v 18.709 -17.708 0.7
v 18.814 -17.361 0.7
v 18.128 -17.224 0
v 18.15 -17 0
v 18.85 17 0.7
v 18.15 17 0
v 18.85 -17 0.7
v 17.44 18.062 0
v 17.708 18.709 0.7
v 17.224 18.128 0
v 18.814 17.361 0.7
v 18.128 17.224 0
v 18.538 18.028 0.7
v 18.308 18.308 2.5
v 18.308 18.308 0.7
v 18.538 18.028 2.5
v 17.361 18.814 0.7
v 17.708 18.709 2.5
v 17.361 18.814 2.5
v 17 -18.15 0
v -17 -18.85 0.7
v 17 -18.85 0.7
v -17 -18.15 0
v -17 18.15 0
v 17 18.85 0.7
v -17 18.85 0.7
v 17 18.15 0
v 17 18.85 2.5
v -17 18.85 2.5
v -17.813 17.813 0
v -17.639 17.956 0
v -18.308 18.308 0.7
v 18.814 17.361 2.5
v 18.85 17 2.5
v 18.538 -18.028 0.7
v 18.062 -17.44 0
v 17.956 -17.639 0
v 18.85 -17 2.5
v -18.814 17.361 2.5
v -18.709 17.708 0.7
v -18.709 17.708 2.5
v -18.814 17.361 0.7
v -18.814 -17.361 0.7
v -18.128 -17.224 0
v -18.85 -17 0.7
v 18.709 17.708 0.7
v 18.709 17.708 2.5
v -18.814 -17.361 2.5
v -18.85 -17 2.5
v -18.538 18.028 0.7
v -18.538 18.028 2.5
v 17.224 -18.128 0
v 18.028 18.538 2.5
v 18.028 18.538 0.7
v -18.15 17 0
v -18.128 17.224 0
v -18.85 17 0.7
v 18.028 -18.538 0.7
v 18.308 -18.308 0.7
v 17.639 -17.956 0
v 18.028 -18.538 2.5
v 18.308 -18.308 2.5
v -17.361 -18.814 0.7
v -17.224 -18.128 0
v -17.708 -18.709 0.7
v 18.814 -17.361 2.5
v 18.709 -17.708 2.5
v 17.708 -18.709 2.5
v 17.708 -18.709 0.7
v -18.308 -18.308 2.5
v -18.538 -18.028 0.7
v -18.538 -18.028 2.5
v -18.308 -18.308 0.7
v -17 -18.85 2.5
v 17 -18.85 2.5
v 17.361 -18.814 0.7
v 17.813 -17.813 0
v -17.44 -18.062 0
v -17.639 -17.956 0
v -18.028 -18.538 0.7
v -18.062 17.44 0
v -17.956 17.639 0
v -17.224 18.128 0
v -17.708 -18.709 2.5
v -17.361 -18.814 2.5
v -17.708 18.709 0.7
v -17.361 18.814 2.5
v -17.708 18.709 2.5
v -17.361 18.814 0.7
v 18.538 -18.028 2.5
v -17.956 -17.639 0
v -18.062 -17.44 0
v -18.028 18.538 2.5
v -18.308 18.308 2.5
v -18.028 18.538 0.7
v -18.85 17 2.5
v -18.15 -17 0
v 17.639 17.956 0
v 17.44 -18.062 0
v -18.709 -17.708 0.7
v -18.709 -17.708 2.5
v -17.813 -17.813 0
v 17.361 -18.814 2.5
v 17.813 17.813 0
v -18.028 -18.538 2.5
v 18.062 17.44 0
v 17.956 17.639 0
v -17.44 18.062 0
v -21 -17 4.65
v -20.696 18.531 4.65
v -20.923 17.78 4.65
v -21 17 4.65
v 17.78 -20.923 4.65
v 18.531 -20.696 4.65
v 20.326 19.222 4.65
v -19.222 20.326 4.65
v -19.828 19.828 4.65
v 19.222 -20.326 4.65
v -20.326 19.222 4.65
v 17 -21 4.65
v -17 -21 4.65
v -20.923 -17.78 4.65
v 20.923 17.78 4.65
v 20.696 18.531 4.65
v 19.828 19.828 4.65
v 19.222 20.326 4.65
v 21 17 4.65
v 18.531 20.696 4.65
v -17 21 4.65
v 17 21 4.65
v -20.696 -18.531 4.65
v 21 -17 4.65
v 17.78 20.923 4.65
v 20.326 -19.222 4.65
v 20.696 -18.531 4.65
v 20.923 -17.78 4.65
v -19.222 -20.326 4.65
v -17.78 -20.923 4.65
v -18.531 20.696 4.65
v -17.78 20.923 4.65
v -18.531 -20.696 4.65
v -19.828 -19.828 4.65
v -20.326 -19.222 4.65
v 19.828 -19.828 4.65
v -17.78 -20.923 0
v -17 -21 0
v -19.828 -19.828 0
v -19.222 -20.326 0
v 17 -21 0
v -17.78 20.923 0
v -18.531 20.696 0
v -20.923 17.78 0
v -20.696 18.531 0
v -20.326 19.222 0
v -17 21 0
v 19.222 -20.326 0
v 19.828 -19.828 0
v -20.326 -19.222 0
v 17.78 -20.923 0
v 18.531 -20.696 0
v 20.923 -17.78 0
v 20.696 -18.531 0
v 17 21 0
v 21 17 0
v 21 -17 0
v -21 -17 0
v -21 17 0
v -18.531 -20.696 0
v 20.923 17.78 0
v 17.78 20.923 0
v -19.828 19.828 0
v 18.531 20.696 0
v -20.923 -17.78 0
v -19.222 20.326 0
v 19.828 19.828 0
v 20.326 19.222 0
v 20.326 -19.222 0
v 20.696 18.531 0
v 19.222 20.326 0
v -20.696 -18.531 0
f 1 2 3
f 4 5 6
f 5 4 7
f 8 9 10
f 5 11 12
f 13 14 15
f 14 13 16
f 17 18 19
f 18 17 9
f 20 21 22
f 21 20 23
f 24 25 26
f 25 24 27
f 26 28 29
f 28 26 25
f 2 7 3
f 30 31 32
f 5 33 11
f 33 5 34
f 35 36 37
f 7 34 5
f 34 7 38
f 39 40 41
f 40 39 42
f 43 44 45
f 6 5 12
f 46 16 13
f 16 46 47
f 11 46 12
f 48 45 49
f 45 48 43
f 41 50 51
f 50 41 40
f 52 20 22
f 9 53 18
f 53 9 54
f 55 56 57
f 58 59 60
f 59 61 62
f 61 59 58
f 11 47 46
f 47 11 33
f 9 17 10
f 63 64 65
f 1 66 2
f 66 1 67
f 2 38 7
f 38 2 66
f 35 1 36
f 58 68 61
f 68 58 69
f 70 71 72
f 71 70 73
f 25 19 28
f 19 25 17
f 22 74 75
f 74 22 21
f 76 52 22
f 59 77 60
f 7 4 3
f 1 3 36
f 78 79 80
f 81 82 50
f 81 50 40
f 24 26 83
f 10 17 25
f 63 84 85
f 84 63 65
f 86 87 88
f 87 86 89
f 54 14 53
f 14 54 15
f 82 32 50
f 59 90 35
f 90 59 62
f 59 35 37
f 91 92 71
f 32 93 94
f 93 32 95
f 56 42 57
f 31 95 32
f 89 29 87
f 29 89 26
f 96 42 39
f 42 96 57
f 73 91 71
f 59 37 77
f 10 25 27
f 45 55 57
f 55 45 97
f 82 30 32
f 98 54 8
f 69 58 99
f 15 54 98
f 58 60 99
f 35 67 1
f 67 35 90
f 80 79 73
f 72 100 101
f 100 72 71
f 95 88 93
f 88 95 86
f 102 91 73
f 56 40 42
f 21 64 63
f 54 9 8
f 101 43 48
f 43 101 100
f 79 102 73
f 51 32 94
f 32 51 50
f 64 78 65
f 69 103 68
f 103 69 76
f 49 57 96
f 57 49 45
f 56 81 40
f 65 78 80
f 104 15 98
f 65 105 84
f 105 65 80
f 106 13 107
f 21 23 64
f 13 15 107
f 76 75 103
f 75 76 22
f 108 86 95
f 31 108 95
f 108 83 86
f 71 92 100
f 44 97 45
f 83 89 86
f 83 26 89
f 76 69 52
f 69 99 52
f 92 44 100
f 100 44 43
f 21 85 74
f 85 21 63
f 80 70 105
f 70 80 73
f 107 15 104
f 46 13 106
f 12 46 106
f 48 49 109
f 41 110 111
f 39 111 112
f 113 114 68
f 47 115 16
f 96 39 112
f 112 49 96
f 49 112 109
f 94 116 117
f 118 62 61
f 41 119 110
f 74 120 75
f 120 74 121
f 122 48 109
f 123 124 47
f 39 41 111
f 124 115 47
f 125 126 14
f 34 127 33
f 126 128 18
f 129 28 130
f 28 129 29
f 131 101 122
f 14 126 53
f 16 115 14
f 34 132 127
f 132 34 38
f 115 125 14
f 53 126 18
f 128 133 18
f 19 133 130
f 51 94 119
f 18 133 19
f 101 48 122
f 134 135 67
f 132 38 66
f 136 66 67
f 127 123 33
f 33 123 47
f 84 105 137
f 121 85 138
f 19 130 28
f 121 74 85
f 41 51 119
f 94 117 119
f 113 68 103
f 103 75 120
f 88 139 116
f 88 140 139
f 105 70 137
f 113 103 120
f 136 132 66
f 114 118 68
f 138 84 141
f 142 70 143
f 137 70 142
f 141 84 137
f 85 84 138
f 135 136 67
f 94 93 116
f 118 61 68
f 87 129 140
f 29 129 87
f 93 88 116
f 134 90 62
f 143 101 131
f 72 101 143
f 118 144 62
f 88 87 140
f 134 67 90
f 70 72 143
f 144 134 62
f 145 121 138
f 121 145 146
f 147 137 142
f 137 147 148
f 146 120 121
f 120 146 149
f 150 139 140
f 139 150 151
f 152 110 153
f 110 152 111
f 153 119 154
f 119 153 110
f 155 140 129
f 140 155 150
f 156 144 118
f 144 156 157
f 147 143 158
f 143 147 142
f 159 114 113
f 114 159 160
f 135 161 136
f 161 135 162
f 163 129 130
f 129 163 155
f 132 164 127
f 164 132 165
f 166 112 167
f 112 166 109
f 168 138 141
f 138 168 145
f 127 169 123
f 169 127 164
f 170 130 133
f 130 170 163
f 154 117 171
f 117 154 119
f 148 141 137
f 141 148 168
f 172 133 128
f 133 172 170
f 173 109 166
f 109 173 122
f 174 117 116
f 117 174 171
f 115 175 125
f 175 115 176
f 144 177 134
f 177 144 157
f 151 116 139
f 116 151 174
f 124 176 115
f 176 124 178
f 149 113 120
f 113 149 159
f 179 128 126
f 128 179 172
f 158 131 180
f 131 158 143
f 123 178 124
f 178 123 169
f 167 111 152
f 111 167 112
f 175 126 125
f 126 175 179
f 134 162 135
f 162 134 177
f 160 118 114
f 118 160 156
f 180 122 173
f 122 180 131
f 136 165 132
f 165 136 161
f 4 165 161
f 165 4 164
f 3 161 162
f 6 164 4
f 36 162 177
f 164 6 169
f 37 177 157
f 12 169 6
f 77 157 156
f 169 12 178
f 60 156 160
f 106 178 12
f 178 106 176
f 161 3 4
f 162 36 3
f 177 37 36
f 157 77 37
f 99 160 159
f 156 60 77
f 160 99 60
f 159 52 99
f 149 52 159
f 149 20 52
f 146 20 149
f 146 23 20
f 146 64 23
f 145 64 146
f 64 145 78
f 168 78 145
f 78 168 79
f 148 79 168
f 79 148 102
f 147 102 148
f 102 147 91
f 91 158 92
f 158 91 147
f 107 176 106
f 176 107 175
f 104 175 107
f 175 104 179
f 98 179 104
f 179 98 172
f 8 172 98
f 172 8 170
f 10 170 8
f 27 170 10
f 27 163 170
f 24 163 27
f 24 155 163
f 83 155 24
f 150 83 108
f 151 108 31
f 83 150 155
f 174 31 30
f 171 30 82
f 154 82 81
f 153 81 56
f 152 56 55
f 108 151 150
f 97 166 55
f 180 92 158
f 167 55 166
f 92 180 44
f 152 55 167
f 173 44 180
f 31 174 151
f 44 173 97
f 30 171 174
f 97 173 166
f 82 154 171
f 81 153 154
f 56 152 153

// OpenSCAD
// file: ../gridfinity_core.scad
// ============================================================================
// Gridfinity Core Geometry Engine
// ============================================================================
// Standard constants, modules, and calculations derived strictly from:
//   - Official Gridfinity Specification v5: https://gridfinity.xyz/specification/
//   - Paul Bone's gfthings: https://github.com/PaulBone/gfthings
//
// Key standards:
//   - Pitch: 42.0 mm center-to-center
//   - Tolerance: 0.25 mm clearance per side (0.5 mm total)
//   - Socket Mouth: 42.0 mm (r = 4.0 mm)
//   - Top Chamfer: 2.15 mm @ 45°
//   - Vertical Waist: 1.80 mm @ 37.7 mm width (r = 1.85 mm)
//   - Bottom Chamfer / Ledge: 0.70 mm @ 45° down to 36.3 mm (r = 1.15 mm)
//   - Socket Depth: 4.65 mm (leaves 0.1 mm clearance relief below 4.75 mm bin foot)
//   - Hole Spacing: 26.0 mm square (13.0 mm from cell center)
// ============================================================================

$fn = 32;

// ---- Grid Pitch & Tolerance ----
GF_PITCH            = 42.0;   // Standard cell spacing (mm)
GF_TOLERANCE        = 0.25;   // Clearance per side (mm)

// ---- Bin Foot Dimensions (Reference) ----
GF_BIN_TOP_W        = 41.50;  // 42.0 - 2 * 0.25
GF_BIN_WAIST_W      = 37.20;  // 41.5 - 2 * 2.15
GF_BIN_BOT_W        = 35.60;  // 37.2 - 2 * 0.80
GF_BIN_TOP_CHAMFER  = 2.15;
GF_BIN_VERT_WAIST   = 1.80;
GF_BIN_BOT_CHAMFER  = 0.80;
GF_BIN_PROFILE_H    = 4.75;   // 2.15 + 1.80 + 0.80
GF_BIN_TOP_R        = 3.75;   // 7.5mm dia
GF_BIN_WAIST_R      = 1.60;   // 3.75 - 2.15
GF_BIN_BOT_R        = 0.80;   // 1.60 - 0.80

// ---- Baseplate Socket Dimensions (+0.25mm Clearance Offset) ----
GF_SOCKET_TOP_W     = 42.00;  // Top mouth opening (mm)
GF_SOCKET_WAIST_W   = 37.70;  // 37.2 + 2 * 0.25 (mm)
GF_SOCKET_BOT_W     = 36.30;  // 37.7 - 2 * 0.70 (mm)

GF_TOP_CHAMFER_H    = 2.15;   // Top lead-in chamfer height (mm)
GF_VERT_WAIST_H     = 1.80;   // Straight vertical waist height (mm)
GF_BOT_CHAMFER_H    = 0.70;   // Bottom seating chamfer height (mm)
GF_PROFILE_H        = GF_TOP_CHAMFER_H + GF_VERT_WAIST_H + GF_BOT_CHAMFER_H; // 4.65 mm

// Corner Radii (Concentric with 4.0mm outer envelope)
GF_SOCKET_TOP_R     = 4.00;   // 8.0mm dia
GF_SOCKET_WAIST_R   = GF_SOCKET_TOP_R - GF_TOP_CHAMFER_H; // 1.85 mm (3.7mm dia)
GF_SOCKET_BOT_R     = GF_SOCKET_WAIST_R - GF_BOT_CHAMFER_H; // 1.15 mm (2.3mm dia)

// ---- Mounting Holes (Magnets & Screws) ----
GF_HOLE_OFFSET      = 13.0;   // Offset from cell center along X & Y (mm)
GF_HOLE_SPACING     = 26.0;   // Center-to-center hole distance (mm)
GF_MAGNET_D         = 6.2;    // Magnet hole diameter (mm, press fit for 6.0mm)
GF_MAGNET_H         = 2.2;    // Magnet hole depth (mm)
GF_SCREW_D          = 3.2;    // Screw hole diameter (mm, clearance for M3)

// ---- Geometry Helper Modules ----

// Centered rounded rectangle extruded to height h
module gf_rounded_rect(w, d, h, r=4) {
    eff_r = min(r, w/2 - 0.01, d/2 - 0.01);
    if (eff_r > 0.01) {
        hull() {
            for (x = [-w/2 + eff_r, w/2 - eff_r]) {
                for (y = [-d/2 + eff_r, d/2 - eff_r]) {
                    translate([x, y, 0])
                        cylinder(r=eff_r, h=h);
                }
            }
        }
    } else {
        translate([-w/2, -d/2, 0])
            cube([w, d, h]);
    }
}

// Subtractive pocket socket conforming strictly to gridfinity.xyz v5
module gf_socket_pocket(open_bottom=true, chamfer_ledge=true, clearance=0, extra_top=1.0, corner_holes=0) {
    top_w   = GF_SOCKET_TOP_W + 2 * clearance;
    waist_w = GF_SOCKET_WAIST_W + 2 * clearance;
    bot_w   = GF_SOCKET_BOT_W + 2 * clearance;
    
    top_r   = max(0.1, GF_SOCKET_TOP_R + clearance);
    waist_r = max(0.1, GF_SOCKET_WAIST_R + clearance);
    bot_r   = max(0.1, GF_SOCKET_BOT_R + clearance);
    
    z_bot = 0;
    z_waist_bot = GF_BOT_CHAMFER_H;
    z_waist_top = GF_BOT_CHAMFER_H + GF_VERT_WAIST_H;
    z_top = GF_PROFILE_H;
    
    // Layer 3: Top 45° Chamfer (from waist_w up to top_w)
    hull() {
        translate([0, 0, z_waist_top])
            gf_rounded_rect(waist_w, waist_w, 0.01, r=waist_r);
        translate([0, 0, z_top])
            gf_rounded_rect(top_w, top_w, 0.01, r=top_r);
    }
    
    // Extra top extension for clean difference cut through top surface
    if (extra_top > 0) {
        translate([0, 0, z_top])
            gf_rounded_rect(top_w, top_w, extra_top, r=top_r);
    }
    
    // Layer 2: Straight vertical waist
    translate([0, 0, z_waist_bot])
        gf_rounded_rect(waist_w, waist_w, GF_VERT_WAIST_H + 0.01, r=waist_r);
    
    // Layer 1: Bottom chamfer / ledge
    if (chamfer_ledge) {
        hull() {
            translate([0, 0, z_bot])
                gf_rounded_rect(bot_w, bot_w, 0.01, r=bot_r);
            translate([0, 0, z_waist_bot])
                gf_rounded_rect(waist_w, waist_w, 0.01, r=waist_r);
        }
        // If bottom is open (Style 0 Ultralight), through-cut the center hole down past Z=0
        if (open_bottom) {
            translate([0, 0, -2]) {
                if (corner_holes > 0) {
                    difference() {
                        gf_rounded_rect(bot_w, bot_w, 2.01, r=bot_r);
                        gf_corner_boss_pads(count=corner_holes, h=4);
                    }
                } else {
                    gf_rounded_rect(bot_w, bot_w, 2.01, r=bot_r);
                }
            }
        }
    } else {
        // If chamfer_ledge is false, cut the waist width straight to bottom
        translate([0, 0, open_bottom ? -2 : 0]) {
            if (open_bottom && corner_holes > 0) {
                difference() {
                    gf_rounded_rect(waist_w, waist_w, 2 + z_waist_bot + 0.01, r=waist_r);
                    gf_corner_boss_pads(count=corner_holes, h=4 + z_waist_bot);
                }
            } else {
                gf_rounded_rect(waist_w, waist_w, (open_bottom ? 2 : 0) + z_waist_bot + 0.01, r=waist_r);
            }
        }
    }
}

// Positive cell outer envelope (standard 42x42 with r=4.0 corners)
module gf_cell_envelope(w=GF_PITCH, d=GF_PITCH, h=GF_PROFILE_H) {
    gf_rounded_rect(w, d, h, r=min(GF_SOCKET_TOP_R, w/2, d/2));
}

// Corner magnet and screw holes per cell (0, 2 diagonal, or 4 corners)
module gf_corner_holes(count=0, magnet_d=GF_MAGNET_D, magnet_h=GF_MAGNET_H, screw_d=GF_SCREW_D, h=GF_PROFILE_H) {
    if (count == 2) {
        // 2 holes at opposite diagonal corners (matching gfthings default)
        _gf_single_corner_hole(-GF_HOLE_OFFSET, -GF_HOLE_OFFSET, magnet_d, magnet_h, screw_d, h);
        _gf_single_corner_hole( GF_HOLE_OFFSET,  GF_HOLE_OFFSET, magnet_d, magnet_h, screw_d, h);
    } else if (count >= 4) {
        // 4 holes in all 4 corners
        for (sx = [-1, 1]) {
            for (sy = [-1, 1]) {
                _gf_single_corner_hole(sx * GF_HOLE_OFFSET, sy * GF_HOLE_OFFSET, magnet_d, magnet_h, screw_d, h);
            }
        }
    }
}

// Helper for a single corner hole (magnet counterbore from bottom + through screw hole)
module _gf_single_corner_hole(x, y, magnet_d, magnet_h, screw_d, h) {
    translate([x, y, 0]) {
        if (magnet_d > 0 && magnet_h > 0) {
            translate([0, 0, -0.01])
                cylinder(d=magnet_d, h=magnet_h + 0.01, $fn=30);
        }
        if (screw_d > 0) {
            translate([0, 0, -1])
                cylinder(d=screw_d, h=h + 2, $fn=24);
        }
    }
}

// Trapezoidal edge cutout along cell walls (inspired by gfthings EdgeCut)
module gf_edge_cut(cut_len=26.0, cut_h=GF_PROFILE_H) {
    tri_w = tan(30) * cut_h;
    short_len = max(0.1, cut_len - 2 * tri_w);
    hull() {
        translate([-short_len/2, -1, 0]) cube([short_len, 2, cut_h]);
        translate([-cut_len/2, -1, cut_h]) cube([cut_len, 2, 0.01]);
    }
}

// Solid corner boss pads for screw/magnet retention in skeleton (open floor) baseplates
module gf_corner_boss_pads(count=0, pad_r=5.5, h=GF_PROFILE_H) {
    if (count == 2) {
        _gf_single_boss_pad(-GF_HOLE_OFFSET, -GF_HOLE_OFFSET, pad_r, h);
        _gf_single_boss_pad( GF_HOLE_OFFSET,  GF_HOLE_OFFSET, pad_r, h);
    } else if (count >= 4) {
        for (sx = [-1, 1]) {
            for (sy = [-1, 1]) {
                _gf_single_boss_pad(sx * GF_HOLE_OFFSET, sy * GF_HOLE_OFFSET, pad_r, h);
            }
        }
    }
}

module _gf_single_boss_pad(x, y, pad_r=5.5, h=GF_PROFILE_H) {
    sx = sign(x);
    sy = sign(y);
    corner_x = sx * (GF_PITCH / 2);
    corner_y = sy * (GF_PITCH / 2);
    hull() {
        translate([x, y, 0])
            cylinder(r=pad_r, h=h);
        translate([corner_x - sx * 4.0, corner_y - sy * 4.0, 0])
            cylinder(r=4.0, h=h);
        translate([corner_x - sx * 4.0, y, 0])
            cylinder(r=3.0, h=h);
        translate([x, corner_y - sy * 4.0, 0])
            cylinder(r=3.0, h=h);
    }
}
// main file
// Test script for gridfinity_core.scad
include <../gridfinity_core.scad>

// Official v5 specification assertions
echo("Checking constants...");
echo(str("GF_PITCH = ", GF_PITCH));
echo(str("GF_SOCKET_TOP_W = ", GF_SOCKET_TOP_W));
echo(str("GF_SOCKET_WAIST_W = ", GF_SOCKET_WAIST_W));
echo(str("GF_SOCKET_BOT_W = ", GF_SOCKET_BOT_W));

assert(GF_PITCH == 42.0, "GF_PITCH must be 42.0");
assert(GF_SOCKET_TOP_W == 42.0, "GF_SOCKET_TOP_W must be 42.0");
assert(GF_SOCKET_WAIST_W == 37.7, "GF_SOCKET_WAIST_W must be 37.7");
assert(GF_SOCKET_BOT_W == 36.3, "GF_SOCKET_BOT_W must be 36.3");
assert(GF_TOP_CHAMFER_H == 2.15, "GF_TOP_CHAMFER_H must be 2.15");
assert(GF_VERT_WAIST_H == 1.80, "GF_VERT_WAIST_H must be 1.80");
assert(GF_BOT_CHAMFER_H == 0.70, "GF_BOT_CHAMFER_H must be 0.70");
assert(GF_PROFILE_H == 4.65, "GF_PROFILE_H must be 4.65");
assert(GF_HOLE_SPACING == 26.0, "GF_HOLE_SPACING must be 26.0");
assert(GF_HOLE_OFFSET == 13.0, "GF_HOLE_OFFSET must be 13.0");

// Test CSG compilation
difference() {
    gf_cell_envelope(GF_PITCH, GF_PITCH, GF_PROFILE_H);
    gf_socket_pocket(open_bottom=true, chamfer_ledge=true);
}
